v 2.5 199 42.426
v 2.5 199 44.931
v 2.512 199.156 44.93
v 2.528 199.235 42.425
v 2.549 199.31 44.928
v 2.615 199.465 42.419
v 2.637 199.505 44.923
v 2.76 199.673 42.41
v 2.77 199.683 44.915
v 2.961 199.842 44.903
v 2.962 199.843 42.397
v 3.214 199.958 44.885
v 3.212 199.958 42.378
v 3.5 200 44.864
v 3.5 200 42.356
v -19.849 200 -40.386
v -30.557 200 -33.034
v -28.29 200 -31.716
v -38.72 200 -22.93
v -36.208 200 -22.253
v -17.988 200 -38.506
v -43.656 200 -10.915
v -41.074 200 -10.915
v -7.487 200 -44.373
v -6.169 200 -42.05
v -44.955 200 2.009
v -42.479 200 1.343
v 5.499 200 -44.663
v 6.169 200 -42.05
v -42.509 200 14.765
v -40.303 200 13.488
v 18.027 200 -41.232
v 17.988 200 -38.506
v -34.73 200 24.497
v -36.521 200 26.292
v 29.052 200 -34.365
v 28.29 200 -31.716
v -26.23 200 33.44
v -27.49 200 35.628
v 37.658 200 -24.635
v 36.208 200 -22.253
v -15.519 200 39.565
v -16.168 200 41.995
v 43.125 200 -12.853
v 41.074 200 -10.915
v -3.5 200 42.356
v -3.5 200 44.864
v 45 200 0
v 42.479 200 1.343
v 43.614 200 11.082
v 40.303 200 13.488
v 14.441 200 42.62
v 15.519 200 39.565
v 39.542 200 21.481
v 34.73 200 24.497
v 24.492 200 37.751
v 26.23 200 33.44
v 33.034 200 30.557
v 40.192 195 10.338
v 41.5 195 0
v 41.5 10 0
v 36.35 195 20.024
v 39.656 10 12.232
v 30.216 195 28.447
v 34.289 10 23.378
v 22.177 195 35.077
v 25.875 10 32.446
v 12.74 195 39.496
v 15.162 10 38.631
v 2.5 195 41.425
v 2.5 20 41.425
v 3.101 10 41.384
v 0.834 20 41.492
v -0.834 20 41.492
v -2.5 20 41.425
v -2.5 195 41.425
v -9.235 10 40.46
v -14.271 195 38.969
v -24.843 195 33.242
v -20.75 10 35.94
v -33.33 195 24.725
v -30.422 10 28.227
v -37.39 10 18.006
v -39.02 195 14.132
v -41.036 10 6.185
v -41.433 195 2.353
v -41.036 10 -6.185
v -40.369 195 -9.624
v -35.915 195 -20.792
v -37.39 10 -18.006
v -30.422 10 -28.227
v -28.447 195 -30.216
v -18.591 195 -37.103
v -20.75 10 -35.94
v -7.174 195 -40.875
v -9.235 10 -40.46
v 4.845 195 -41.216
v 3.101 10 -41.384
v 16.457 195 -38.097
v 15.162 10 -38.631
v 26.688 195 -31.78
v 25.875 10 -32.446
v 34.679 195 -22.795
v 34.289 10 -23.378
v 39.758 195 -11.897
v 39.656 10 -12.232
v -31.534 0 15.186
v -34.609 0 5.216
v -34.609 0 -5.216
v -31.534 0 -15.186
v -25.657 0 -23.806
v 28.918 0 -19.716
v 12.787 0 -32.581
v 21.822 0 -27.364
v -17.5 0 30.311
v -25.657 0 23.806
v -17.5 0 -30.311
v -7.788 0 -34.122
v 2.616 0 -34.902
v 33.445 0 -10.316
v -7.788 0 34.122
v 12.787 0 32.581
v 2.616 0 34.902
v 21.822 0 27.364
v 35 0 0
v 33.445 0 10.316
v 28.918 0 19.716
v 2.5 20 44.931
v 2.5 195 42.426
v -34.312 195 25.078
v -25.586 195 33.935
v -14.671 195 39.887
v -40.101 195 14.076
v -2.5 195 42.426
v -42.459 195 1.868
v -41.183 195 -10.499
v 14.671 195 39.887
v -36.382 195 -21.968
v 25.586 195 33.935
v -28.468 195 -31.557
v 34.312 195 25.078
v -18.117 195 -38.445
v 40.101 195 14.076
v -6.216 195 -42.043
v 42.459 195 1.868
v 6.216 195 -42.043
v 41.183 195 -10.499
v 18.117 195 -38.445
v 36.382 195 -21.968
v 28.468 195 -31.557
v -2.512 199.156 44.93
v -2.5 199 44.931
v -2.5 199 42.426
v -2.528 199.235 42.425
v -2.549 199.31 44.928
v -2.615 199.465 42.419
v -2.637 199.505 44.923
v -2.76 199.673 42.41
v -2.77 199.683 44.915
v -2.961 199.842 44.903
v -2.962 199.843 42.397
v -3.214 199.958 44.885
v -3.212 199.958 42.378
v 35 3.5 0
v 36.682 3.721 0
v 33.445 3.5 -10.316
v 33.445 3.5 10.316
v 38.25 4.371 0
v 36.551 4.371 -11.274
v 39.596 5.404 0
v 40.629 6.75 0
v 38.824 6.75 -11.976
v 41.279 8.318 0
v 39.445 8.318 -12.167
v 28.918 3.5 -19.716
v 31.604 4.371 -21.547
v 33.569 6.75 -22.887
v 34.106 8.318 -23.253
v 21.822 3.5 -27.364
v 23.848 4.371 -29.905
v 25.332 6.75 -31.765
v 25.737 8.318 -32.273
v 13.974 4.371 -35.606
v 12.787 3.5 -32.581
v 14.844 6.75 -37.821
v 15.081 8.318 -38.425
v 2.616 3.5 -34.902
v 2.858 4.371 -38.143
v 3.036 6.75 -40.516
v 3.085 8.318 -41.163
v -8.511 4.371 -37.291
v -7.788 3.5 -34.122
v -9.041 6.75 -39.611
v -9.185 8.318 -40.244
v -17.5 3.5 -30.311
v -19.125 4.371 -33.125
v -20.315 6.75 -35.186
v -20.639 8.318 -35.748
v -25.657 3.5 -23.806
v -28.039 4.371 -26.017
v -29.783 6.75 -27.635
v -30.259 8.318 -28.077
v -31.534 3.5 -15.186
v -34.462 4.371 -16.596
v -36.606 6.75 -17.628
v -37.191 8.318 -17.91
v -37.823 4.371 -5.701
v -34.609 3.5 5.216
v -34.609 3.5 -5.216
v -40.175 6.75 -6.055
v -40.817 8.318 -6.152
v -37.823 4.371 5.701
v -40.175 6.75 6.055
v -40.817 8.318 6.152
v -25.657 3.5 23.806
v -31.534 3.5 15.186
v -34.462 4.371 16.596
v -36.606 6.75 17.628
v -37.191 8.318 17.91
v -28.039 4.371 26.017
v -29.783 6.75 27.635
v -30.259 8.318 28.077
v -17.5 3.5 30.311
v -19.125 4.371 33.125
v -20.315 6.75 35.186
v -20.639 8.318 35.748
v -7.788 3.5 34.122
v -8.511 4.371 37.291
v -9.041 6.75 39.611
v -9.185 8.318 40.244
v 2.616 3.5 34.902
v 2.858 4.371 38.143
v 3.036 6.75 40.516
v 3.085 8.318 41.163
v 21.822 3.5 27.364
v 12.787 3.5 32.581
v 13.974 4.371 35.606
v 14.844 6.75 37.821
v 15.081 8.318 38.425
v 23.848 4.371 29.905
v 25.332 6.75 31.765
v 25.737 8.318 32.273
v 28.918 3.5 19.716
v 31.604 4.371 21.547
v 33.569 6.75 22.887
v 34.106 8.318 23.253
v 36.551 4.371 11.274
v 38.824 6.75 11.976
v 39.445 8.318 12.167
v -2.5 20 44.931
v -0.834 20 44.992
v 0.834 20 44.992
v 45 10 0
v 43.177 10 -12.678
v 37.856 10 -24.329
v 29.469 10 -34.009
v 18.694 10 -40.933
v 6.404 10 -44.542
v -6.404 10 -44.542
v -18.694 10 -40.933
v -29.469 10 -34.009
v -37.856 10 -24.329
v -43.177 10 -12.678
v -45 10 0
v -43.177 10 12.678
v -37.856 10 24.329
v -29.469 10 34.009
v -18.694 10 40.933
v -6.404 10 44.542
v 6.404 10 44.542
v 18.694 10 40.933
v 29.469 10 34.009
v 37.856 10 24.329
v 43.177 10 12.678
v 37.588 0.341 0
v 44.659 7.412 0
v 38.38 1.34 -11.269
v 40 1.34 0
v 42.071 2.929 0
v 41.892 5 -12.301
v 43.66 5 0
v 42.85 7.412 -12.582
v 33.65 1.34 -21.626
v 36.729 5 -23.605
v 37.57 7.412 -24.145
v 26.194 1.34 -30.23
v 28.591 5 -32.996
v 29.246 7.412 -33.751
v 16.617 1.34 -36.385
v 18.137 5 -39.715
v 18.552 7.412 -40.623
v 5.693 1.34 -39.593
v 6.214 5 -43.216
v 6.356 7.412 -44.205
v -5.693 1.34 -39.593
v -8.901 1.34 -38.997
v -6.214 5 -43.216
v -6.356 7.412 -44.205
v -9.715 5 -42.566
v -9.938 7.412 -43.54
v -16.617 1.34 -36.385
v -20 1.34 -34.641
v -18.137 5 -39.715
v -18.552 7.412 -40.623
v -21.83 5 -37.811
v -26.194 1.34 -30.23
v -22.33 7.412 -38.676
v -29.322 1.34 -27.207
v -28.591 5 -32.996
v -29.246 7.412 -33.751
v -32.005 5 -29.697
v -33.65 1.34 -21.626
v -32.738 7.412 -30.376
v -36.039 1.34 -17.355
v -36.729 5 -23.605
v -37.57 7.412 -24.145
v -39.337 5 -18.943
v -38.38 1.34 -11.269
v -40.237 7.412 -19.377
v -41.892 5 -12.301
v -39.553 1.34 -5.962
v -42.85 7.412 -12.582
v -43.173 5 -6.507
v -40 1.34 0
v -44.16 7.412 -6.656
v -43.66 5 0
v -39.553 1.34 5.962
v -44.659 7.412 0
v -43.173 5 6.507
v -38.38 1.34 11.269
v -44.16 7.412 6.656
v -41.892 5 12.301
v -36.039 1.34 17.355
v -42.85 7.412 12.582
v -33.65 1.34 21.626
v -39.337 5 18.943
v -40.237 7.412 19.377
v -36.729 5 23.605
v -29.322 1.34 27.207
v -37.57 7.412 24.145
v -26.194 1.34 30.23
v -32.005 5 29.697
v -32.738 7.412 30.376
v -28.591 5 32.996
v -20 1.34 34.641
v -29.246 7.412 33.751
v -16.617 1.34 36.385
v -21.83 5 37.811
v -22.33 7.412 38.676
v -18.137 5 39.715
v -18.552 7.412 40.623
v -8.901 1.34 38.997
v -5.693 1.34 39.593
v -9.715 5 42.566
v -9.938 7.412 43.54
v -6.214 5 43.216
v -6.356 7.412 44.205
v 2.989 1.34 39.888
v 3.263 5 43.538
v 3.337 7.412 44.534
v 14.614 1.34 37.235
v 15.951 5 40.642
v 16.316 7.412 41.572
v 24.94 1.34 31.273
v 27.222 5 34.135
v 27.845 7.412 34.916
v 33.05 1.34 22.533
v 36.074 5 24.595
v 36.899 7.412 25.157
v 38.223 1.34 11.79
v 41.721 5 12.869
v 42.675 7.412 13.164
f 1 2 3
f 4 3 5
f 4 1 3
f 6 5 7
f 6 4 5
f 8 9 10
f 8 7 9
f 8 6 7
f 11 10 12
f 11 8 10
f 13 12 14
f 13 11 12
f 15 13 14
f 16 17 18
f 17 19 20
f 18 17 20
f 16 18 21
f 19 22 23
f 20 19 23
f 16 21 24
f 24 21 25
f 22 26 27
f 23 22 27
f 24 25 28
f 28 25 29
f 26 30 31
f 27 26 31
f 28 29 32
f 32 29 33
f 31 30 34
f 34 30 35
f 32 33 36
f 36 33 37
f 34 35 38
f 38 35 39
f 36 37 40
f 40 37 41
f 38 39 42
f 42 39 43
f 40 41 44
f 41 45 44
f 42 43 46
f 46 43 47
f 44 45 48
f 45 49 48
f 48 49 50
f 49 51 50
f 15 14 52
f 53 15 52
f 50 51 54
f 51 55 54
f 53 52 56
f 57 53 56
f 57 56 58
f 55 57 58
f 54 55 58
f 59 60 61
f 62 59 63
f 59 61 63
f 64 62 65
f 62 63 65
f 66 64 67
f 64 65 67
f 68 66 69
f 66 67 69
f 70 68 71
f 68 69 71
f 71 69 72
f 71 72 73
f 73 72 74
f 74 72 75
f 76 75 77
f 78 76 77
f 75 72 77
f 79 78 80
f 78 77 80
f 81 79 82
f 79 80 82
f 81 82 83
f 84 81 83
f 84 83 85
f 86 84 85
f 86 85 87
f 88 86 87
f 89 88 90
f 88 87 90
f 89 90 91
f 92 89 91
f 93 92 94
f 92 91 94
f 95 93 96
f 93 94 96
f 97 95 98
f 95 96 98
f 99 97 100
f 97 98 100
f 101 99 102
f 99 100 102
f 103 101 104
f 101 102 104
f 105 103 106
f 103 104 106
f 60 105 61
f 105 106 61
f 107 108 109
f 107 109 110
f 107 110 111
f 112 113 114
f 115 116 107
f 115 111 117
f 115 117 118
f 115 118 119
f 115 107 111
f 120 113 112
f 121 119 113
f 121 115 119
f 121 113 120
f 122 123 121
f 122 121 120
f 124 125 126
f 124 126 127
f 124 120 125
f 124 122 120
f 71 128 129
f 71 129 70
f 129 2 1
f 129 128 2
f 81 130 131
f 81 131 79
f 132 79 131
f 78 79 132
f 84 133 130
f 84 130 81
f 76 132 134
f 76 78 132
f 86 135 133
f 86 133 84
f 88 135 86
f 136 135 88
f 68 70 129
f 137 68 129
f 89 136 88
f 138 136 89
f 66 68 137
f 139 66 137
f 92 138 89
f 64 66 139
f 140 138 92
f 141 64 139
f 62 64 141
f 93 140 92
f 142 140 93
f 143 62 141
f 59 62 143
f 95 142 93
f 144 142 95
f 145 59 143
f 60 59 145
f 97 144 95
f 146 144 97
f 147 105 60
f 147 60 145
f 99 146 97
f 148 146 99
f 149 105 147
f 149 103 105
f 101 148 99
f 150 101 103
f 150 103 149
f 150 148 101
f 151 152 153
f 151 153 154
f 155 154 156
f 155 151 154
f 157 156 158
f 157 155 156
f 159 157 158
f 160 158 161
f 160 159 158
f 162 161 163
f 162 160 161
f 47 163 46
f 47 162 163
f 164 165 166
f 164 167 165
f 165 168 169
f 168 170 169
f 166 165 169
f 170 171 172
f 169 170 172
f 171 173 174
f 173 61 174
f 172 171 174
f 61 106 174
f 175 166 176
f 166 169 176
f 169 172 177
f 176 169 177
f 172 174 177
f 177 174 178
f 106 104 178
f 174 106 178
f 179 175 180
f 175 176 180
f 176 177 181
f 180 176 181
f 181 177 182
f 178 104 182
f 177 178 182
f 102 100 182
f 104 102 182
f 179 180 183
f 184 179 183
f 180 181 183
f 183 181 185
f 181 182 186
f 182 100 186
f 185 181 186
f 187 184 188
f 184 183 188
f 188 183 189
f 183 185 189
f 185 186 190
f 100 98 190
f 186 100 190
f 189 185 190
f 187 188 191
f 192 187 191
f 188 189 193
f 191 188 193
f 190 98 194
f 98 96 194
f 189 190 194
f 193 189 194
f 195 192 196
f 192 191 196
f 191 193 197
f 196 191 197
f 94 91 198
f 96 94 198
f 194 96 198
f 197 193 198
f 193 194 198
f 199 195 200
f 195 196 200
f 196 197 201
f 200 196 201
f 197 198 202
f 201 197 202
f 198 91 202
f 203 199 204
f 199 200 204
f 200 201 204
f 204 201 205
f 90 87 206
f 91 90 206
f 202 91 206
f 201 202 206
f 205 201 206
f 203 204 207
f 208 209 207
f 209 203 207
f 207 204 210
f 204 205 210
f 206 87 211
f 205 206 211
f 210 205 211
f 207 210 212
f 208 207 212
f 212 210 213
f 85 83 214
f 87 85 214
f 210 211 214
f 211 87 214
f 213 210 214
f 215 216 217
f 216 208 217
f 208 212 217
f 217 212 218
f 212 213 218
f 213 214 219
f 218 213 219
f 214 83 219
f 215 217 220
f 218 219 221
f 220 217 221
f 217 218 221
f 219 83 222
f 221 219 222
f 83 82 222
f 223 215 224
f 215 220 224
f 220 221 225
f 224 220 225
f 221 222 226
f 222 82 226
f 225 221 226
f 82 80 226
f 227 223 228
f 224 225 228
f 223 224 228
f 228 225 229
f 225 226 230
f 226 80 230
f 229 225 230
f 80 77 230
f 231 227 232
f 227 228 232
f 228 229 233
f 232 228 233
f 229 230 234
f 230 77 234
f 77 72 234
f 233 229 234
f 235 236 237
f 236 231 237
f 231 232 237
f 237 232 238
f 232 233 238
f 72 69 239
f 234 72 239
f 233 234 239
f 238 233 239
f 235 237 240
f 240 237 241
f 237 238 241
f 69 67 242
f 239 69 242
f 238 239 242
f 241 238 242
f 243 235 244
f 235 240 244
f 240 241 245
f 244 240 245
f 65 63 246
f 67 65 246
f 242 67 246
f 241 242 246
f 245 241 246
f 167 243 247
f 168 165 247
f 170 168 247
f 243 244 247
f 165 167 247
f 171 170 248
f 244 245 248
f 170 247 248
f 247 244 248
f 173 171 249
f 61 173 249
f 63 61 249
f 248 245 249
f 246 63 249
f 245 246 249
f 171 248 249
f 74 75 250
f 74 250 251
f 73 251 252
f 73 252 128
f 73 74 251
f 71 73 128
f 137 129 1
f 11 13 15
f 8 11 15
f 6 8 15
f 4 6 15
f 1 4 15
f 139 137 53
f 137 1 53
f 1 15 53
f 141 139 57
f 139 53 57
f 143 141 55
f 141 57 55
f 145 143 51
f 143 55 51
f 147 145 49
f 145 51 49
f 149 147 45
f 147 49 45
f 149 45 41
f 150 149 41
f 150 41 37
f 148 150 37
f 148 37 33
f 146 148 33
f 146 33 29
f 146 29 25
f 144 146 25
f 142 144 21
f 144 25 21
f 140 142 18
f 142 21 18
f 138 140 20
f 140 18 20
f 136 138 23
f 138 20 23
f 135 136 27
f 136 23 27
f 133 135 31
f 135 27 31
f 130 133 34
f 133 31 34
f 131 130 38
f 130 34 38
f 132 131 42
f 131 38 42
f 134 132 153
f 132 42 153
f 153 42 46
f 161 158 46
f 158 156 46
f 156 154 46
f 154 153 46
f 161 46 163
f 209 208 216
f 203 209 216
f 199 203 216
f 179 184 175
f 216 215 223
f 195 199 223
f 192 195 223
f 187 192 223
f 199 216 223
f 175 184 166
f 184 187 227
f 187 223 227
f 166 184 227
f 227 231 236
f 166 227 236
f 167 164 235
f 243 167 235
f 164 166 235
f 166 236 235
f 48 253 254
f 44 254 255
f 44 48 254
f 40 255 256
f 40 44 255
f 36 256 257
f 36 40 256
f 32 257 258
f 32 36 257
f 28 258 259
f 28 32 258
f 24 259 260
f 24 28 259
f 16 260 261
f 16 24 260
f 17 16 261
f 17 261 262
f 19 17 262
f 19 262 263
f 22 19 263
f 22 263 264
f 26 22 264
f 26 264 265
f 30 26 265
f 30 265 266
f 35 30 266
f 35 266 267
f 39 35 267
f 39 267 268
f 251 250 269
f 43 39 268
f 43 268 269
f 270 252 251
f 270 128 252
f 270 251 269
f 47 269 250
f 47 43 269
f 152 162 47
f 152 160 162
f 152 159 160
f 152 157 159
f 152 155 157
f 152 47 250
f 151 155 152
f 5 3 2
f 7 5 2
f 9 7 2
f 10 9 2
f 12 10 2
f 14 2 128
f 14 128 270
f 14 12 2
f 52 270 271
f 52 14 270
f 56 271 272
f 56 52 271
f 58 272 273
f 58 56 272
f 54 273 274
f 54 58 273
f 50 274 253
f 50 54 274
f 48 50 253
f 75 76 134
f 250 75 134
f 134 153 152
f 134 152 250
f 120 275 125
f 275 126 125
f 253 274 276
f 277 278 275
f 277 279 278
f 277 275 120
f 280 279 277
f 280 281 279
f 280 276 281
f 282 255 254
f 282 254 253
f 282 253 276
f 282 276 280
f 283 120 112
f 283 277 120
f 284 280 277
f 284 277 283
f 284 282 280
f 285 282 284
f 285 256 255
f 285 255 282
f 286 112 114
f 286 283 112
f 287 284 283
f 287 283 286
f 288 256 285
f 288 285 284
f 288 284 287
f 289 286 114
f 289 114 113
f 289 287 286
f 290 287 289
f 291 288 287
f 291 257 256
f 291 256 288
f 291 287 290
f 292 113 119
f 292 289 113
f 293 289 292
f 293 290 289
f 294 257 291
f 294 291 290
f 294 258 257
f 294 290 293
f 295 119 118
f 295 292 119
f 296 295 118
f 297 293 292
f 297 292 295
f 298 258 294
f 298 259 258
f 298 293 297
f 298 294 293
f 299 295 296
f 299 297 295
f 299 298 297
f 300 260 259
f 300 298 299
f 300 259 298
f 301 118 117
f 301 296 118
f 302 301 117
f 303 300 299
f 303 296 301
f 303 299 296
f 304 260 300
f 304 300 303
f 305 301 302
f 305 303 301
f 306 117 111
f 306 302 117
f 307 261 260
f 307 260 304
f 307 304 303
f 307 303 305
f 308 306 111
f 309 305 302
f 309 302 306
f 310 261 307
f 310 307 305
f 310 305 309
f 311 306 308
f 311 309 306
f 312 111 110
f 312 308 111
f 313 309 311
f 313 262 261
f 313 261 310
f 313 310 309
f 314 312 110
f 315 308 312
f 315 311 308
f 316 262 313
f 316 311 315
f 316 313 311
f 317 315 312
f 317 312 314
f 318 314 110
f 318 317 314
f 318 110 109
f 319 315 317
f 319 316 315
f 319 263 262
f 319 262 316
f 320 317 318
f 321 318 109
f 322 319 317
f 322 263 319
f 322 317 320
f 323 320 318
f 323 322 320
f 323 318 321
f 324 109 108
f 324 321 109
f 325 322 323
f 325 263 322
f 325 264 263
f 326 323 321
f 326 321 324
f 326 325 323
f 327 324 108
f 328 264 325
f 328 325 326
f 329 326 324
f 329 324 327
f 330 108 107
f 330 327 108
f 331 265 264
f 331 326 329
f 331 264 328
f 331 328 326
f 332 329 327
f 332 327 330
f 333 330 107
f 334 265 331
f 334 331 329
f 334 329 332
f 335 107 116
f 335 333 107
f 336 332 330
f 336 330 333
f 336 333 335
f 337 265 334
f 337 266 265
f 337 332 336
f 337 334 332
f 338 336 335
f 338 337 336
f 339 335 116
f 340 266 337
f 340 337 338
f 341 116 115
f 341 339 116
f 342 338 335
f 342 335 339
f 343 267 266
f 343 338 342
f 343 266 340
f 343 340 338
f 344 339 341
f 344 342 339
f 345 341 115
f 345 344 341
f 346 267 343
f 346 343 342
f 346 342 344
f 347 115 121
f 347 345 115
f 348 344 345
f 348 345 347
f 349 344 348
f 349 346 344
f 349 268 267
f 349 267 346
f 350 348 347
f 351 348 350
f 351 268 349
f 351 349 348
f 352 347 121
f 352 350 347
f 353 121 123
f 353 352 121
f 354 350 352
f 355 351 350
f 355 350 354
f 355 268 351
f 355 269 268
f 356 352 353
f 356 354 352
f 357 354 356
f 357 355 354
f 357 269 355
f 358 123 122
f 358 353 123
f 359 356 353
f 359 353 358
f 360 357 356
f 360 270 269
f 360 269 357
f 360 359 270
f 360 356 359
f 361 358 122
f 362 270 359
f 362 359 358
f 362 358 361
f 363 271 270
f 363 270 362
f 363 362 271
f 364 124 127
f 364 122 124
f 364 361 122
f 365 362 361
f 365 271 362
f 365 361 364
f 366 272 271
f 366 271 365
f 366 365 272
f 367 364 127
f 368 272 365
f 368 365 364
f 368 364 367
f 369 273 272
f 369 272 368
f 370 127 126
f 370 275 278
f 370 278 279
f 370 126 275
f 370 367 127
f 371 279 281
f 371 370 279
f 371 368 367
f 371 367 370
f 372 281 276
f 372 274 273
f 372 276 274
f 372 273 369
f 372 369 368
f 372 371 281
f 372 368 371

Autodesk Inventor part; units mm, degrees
ref_plane "YZ Plane" through (0, 0, 0) normal (1, 0, 0) x (0, 1, 0)
ref_plane "XZ Plane" through (0, 0, 0) normal (0, 1, 0) x (-1, 0, 0)
ref_plane "XY Plane" through (0, 0, 0) normal (0, 0, 1) x (1, 0, 0)
sketch "Sketch1" plane through (0, 0, 0) normal (0, 0, 1) x (1, 0, 0)
  line L0 (0, 0) -> (35, 0)
  line L1 (45, 10) -> (45, 200)
  line L2 (0, 200) -> (0, 0)
  arc A0 (35, 0) -> (45, 10) centre (35, 10) ccw
  line L3 (41.5, 200) -> (41.5, 10)
  arc A1 (35, 3.5) -> (41.5, 10) centre (35, 10) ccw
  line L4 (35, 3.5) -> (0, 3.5)
  line L5 (41.5, 200) -> (45, 200)
  line L6 (0, 3.5) -> (0, 0)
  point P0 (45, 0)
  dimension "d0" = 90
  dimension "d1" = 200
  dimension "d2" = 10
  dimension "d5" = 3.5
  dimension "d6" = 3.5
revolve "Revolution1" add sketch "Sketch1" angle 360 about axis through (0, 200, 0) along (0, -1, 0)
sketch "Sketch2" plane through (0, 200, 0) normal (0, 1, 0) x (1, 0, 0)
  circle A0 centre (0, 0) radius 45 construction
  line L0 (0, 45) -> (0, -45) construction
  line L1 (-45, 0) -> (45, 0) construction
  circle A1 centre (0, 0) radius 45 construction
  circle A2 centre (0, 0) radius 41.5 construction
  circle A3 centre (0, 0) radius 41.5 construction
  circle A4 centre (0, 0) radius 45 construction
  line L2 (0, -41.5) -> (0, -45) construction
  line L3 (-2.5, -45.45) -> (2.5, -45.45)
  line L4 (2.5, -45.45) -> (2.5, -41.05)
  line L5 (2.5, -41.05) -> (-2.5, -41.05)
  line L6 (-2.5, -41.05) -> (-2.5, -45.45)
  line L7 (-2.5, -45.45) -> (2.5, -41.05) construction
  line L8 (2.5, -45.45) -> (-2.5, -41.05) construction
  point P0 (0, -43.25)
  dimension "d8" = 5
  dimension "d9" = 4.4
extrude "Extrusion1" cut sketch "Sketch2" against normal blind 180
fillet "Fillet1" radius 1 2 edges at (-2.5, 200, 43.1776) (2.5, 200, 43.1776)
sketch "Sketch3" plane through (0, 200, 0) normal (0, 1, 0) x (1, 0, 0)
  arc A0 (3.5, -41.3521) -> (-3.5, -41.3521) centre (0, 0) ccw projected
  circle A1 centre (0, 0) radius 42.5
  circle A2 centre (0, 0) radius 41.5
  point P0 (3.5, -41.3521)
  point P1 (-3.5, -41.3521)
  dimension "d13" = 85
extrude "Extrusion2" cut sketch "Sketch3" against normal blind 5
properties part number "Exterior" material "ABS Plastic"
